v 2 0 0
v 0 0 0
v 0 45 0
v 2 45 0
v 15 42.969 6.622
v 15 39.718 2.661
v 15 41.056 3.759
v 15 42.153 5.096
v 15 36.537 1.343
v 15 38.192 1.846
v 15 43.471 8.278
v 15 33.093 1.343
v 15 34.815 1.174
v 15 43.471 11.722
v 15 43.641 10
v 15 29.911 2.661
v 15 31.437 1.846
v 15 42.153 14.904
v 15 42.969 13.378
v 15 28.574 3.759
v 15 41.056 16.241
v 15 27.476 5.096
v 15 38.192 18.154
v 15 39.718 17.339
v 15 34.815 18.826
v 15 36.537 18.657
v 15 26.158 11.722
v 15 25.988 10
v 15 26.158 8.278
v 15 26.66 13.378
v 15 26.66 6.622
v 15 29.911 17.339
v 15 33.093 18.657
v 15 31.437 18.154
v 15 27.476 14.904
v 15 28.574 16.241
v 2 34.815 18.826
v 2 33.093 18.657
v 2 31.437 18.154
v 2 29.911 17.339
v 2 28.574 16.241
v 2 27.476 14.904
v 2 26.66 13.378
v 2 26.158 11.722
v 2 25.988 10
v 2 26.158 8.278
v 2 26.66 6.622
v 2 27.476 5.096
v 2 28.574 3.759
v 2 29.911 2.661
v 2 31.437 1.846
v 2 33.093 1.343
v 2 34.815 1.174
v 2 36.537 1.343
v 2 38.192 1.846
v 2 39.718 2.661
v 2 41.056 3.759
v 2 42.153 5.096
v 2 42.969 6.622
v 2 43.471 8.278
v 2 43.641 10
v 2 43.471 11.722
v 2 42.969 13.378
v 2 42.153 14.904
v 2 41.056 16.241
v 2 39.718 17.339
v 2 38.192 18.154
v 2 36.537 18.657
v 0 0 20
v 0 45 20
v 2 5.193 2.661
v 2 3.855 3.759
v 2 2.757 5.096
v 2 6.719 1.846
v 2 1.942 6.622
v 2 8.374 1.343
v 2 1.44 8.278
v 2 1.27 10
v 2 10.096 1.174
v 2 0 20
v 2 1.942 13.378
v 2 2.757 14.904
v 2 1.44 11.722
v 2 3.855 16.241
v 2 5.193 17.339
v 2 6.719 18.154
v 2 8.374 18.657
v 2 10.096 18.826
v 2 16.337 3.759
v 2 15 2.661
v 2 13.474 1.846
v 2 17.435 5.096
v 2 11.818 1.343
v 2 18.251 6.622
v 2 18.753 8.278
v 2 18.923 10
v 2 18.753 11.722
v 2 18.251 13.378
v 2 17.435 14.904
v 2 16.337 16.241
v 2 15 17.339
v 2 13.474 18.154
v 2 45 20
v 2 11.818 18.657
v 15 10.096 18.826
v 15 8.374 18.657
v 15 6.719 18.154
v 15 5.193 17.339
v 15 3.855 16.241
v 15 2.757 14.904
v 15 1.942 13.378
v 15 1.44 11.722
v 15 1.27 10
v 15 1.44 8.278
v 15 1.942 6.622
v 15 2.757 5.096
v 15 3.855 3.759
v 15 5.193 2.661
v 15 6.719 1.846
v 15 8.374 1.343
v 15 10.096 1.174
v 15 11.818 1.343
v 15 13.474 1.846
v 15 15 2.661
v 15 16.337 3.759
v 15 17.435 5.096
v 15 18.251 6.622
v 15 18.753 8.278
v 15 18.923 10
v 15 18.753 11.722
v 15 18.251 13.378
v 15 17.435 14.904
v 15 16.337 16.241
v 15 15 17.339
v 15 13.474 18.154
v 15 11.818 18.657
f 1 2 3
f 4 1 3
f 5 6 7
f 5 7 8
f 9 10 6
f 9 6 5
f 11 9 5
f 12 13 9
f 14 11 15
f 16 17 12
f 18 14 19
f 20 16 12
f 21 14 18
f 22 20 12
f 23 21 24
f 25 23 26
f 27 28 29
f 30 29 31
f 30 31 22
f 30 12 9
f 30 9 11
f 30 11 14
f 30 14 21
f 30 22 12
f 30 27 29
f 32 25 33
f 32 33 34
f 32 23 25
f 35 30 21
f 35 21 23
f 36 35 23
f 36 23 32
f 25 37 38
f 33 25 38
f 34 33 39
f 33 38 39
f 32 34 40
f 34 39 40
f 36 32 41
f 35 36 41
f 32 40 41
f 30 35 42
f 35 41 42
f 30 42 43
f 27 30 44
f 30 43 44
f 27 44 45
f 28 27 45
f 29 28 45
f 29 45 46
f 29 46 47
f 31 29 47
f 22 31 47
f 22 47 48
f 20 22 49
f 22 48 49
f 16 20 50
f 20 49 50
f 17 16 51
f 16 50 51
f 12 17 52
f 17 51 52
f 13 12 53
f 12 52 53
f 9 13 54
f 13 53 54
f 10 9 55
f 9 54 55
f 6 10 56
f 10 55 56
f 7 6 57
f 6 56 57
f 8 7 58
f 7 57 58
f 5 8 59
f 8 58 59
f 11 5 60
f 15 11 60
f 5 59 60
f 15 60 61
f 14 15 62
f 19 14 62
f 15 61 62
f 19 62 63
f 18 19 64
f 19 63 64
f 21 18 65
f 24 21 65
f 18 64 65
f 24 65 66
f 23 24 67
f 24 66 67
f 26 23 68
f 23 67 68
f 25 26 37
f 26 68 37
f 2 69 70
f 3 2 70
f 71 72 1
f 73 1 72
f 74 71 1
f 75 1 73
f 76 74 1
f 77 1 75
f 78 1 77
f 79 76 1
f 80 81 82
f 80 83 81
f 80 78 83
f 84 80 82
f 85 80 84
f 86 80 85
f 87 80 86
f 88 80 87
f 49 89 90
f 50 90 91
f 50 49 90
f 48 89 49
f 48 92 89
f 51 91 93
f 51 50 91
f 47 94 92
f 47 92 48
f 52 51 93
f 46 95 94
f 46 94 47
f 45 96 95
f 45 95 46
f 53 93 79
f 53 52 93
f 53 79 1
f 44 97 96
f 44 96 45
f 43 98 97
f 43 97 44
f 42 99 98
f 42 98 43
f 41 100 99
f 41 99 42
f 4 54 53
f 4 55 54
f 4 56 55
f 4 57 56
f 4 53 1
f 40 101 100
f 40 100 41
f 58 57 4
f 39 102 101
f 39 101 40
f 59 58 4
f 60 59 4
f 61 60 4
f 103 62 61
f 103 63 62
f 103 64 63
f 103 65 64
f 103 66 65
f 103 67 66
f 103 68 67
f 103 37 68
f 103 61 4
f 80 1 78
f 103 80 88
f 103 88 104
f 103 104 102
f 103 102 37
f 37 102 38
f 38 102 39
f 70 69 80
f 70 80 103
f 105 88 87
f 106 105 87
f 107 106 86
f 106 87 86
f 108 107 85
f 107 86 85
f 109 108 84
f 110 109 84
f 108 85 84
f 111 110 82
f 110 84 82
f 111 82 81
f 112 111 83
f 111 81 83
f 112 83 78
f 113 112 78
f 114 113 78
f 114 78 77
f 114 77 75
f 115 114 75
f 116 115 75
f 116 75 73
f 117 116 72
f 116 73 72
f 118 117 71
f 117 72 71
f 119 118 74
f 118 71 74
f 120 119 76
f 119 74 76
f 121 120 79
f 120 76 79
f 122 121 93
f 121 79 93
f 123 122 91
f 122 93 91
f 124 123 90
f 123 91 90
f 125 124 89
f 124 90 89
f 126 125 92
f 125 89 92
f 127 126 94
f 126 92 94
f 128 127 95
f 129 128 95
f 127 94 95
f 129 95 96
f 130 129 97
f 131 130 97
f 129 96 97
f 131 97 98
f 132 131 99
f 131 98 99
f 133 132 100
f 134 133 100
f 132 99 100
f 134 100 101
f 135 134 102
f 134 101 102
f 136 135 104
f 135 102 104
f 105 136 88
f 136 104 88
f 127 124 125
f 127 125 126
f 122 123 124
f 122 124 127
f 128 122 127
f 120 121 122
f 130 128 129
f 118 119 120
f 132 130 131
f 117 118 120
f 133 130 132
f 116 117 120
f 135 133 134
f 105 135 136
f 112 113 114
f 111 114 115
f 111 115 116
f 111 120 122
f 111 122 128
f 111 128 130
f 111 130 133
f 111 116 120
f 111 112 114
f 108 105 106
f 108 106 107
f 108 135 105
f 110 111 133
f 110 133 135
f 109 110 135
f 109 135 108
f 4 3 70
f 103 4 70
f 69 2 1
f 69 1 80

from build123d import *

# Parameters (mm, degrees)
SKETCH1_W           = 45
SKETCH1_H           = 20
BOSS_EXTRUDE1_DEPTH = 2
SKETCH2_R           = 8.826284226
BOSS_EXTRUDE3_DEPTH = 13
SKETCH2_5_R         = 8.826284226
BOSS_EXTRUDE4_DEPTH = 13


with BuildPart() as part:
    # Sketch1 → Boss-Extrude1 (new body)
    with BuildSketch(Plane.YZ):
        with Locations((22.5, 10)):
            Rectangle(SKETCH1_W, SKETCH1_H)
    extrude(amount=BOSS_EXTRUDE1_DEPTH)

    # Sketch2 → Boss-Extrude3 (add)
    with BuildSketch(Plane.YZ.offset(2)):
        with Locations((10.096276732, 10)):
            Circle(SKETCH2_R)
    extrude(amount=BOSS_EXTRUDE3_DEPTH)

    # Sketch2<5> → Boss-Extrude4 (add)
    with BuildSketch(Plane.YZ.offset(2)):
        with Locations((34.814683325, 10)):
            Circle(SKETCH2_5_R)
    extrude(amount=BOSS_EXTRUDE4_DEPTH)


solid = part.part
